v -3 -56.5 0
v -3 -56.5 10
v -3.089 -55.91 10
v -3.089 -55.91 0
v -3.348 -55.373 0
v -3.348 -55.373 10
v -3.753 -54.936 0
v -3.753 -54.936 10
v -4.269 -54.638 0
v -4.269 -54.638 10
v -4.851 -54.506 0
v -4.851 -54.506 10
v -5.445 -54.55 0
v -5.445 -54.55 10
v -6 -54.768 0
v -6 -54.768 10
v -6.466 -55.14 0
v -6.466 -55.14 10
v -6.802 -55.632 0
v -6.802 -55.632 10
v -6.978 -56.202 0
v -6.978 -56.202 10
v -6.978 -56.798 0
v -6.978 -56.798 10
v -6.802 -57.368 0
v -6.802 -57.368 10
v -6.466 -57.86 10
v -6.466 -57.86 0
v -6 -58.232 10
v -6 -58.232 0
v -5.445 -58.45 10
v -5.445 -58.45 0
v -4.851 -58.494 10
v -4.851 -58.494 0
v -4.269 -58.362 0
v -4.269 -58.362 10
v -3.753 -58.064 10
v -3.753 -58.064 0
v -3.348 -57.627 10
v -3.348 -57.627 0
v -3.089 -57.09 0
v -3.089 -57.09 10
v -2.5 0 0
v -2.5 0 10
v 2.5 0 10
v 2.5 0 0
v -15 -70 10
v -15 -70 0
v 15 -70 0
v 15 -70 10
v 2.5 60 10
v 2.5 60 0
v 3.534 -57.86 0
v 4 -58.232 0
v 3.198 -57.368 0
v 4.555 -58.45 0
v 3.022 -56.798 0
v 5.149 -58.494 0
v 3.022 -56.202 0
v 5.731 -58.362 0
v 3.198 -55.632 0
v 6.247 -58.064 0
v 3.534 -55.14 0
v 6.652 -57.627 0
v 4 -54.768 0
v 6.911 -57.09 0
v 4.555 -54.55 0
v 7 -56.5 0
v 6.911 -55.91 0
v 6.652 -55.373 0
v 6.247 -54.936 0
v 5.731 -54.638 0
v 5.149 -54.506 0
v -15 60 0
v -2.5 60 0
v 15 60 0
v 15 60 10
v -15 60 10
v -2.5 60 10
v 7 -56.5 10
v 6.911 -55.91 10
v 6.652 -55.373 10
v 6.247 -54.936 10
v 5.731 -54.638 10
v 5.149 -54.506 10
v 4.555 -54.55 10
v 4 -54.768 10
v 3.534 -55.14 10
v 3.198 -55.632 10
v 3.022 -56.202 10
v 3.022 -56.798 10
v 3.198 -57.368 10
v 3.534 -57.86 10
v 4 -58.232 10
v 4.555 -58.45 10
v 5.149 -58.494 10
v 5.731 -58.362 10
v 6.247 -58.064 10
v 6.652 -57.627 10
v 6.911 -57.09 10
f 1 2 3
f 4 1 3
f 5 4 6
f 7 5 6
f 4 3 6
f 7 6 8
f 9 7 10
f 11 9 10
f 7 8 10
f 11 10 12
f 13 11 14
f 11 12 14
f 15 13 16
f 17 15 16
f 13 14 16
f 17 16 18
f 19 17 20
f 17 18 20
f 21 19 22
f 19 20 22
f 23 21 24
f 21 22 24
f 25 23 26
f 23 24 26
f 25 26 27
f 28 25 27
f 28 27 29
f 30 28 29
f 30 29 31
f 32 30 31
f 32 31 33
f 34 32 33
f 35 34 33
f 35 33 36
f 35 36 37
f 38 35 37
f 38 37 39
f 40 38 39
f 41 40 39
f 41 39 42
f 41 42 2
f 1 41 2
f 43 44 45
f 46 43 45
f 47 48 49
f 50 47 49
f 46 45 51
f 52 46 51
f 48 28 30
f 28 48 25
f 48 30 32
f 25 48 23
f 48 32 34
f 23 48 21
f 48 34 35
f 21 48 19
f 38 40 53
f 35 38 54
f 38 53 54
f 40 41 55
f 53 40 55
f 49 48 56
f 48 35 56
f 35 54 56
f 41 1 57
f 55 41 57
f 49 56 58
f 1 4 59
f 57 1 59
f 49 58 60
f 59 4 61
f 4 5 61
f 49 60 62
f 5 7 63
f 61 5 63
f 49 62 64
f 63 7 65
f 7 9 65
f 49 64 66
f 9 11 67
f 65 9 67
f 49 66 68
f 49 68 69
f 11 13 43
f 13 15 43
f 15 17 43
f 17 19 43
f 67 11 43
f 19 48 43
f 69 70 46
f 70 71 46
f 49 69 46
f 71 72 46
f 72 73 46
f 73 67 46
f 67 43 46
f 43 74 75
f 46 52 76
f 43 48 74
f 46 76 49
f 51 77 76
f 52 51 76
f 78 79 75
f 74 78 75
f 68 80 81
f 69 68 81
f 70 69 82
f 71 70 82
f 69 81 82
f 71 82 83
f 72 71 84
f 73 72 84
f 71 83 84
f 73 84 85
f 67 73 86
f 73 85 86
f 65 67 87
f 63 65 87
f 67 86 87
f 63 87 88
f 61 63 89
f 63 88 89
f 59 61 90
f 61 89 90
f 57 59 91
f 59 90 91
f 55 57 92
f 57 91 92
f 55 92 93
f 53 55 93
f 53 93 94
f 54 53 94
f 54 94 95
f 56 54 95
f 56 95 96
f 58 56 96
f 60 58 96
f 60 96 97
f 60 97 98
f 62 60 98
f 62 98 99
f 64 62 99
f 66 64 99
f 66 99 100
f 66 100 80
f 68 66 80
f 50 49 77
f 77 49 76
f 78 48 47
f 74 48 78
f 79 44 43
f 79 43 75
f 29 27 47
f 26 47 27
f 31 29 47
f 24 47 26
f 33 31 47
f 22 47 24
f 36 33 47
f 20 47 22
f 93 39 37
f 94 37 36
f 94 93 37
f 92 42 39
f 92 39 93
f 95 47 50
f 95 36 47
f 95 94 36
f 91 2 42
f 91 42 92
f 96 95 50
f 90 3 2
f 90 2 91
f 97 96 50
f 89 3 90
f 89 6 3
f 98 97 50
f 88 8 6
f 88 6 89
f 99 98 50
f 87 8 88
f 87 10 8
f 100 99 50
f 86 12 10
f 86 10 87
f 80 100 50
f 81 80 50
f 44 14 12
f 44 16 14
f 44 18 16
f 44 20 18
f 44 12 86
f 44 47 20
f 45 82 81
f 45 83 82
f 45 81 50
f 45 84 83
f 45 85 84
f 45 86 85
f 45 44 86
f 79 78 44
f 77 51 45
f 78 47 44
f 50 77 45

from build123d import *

# Parameters (mm, degrees)
ESBO_O1_W                = 30
ESBO_O1_H                = 140
RESSALTO_EXTRUS_O1_DEPTH = 10
CORTE_EXTRUS_O1_REACH    = 74.284
ESBO_O2_R                = 2
CORTE_EXTRUS_O2_REACH    = 78.811
ESBO_O3_W                = 10
ESBO_O3_H                = 10
CORTE_EXTRUS_O3_REACH    = 74.284
ESBO_O4_W                = 5
ESBO_O4_H                = 60


with BuildPart() as part:
    # Esboço1 → Ressalto-extrusão1 (new body)
    with BuildSketch(Plane.XY):
        Rectangle(ESBO_O1_W, ESBO_O1_H)
    extrude(amount=RESSALTO_EXTRUS_O1_DEPTH)

    # Esboço2 → Corte-extrusão1 (cut, up to next)
    with BuildSketch(Plane.XY.offset(10), mode=Mode.PRIVATE) as corte_extrus_o1_sk1:
        with Locations((-5, -56.5)):
            Circle(ESBO_O2_R)
    corte_extrus_o1_tool1 = extrude(corte_extrus_o1_sk1.sketch, amount=-CORTE_EXTRUS_O1_REACH, mode=Mode.PRIVATE) & part.part
    # Esboço2 → Corte-extrusão1 (cut, up to next)
    with BuildSketch(Plane.XY.offset(10), mode=Mode.PRIVATE) as corte_extrus_o1_sk2:
        with Locations((5, -56.5)):
            Circle(ESBO_O2_R)
    corte_extrus_o1_tool2 = extrude(corte_extrus_o1_sk2.sketch, amount=-CORTE_EXTRUS_O1_REACH, mode=Mode.PRIVATE) & part.part
    add(corte_extrus_o1_tool1.solids().sort_by_distance((-5, -56.5, 10))[0], mode=Mode.SUBTRACT)
    add(corte_extrus_o1_tool2.solids().sort_by_distance((5, -56.5, 10))[0], mode=Mode.SUBTRACT)

    # Esboço3 → Corte-extrusão2 (cut, up to next)
    with BuildSketch(Plane(origin=(15, 0, 0), x_dir=(0, 0, -1), z_dir=(1, 0, 0)), mode=Mode.PRIVATE) as corte_extrus_o2_sk1:
        with Locations((-5, 65)):
            Rectangle(ESBO_O3_W, ESBO_O3_H)
    corte_extrus_o2_tool1 = extrude(corte_extrus_o2_sk1.sketch, amount=-CORTE_EXTRUS_O2_REACH, mode=Mode.PRIVATE) & part.part
    add(corte_extrus_o2_tool1.solids().sort_by_distance((15, 65, 5))[0], mode=Mode.SUBTRACT)

    # Esboço4 → Corte-extrusão3 (cut, up to next)
    with BuildSketch(Plane.XY.offset(10), mode=Mode.PRIVATE) as corte_extrus_o3_sk1:
        with Locations((0, 30)):
            Rectangle(ESBO_O4_W, ESBO_O4_H)
    corte_extrus_o3_tool1 = extrude(corte_extrus_o3_sk1.sketch, amount=-CORTE_EXTRUS_O3_REACH, mode=Mode.PRIVATE) & part.part
    add(corte_extrus_o3_tool1.solids().sort_by_distance((0, 30, 10))[0], mode=Mode.SUBTRACT)


solid = part.part
